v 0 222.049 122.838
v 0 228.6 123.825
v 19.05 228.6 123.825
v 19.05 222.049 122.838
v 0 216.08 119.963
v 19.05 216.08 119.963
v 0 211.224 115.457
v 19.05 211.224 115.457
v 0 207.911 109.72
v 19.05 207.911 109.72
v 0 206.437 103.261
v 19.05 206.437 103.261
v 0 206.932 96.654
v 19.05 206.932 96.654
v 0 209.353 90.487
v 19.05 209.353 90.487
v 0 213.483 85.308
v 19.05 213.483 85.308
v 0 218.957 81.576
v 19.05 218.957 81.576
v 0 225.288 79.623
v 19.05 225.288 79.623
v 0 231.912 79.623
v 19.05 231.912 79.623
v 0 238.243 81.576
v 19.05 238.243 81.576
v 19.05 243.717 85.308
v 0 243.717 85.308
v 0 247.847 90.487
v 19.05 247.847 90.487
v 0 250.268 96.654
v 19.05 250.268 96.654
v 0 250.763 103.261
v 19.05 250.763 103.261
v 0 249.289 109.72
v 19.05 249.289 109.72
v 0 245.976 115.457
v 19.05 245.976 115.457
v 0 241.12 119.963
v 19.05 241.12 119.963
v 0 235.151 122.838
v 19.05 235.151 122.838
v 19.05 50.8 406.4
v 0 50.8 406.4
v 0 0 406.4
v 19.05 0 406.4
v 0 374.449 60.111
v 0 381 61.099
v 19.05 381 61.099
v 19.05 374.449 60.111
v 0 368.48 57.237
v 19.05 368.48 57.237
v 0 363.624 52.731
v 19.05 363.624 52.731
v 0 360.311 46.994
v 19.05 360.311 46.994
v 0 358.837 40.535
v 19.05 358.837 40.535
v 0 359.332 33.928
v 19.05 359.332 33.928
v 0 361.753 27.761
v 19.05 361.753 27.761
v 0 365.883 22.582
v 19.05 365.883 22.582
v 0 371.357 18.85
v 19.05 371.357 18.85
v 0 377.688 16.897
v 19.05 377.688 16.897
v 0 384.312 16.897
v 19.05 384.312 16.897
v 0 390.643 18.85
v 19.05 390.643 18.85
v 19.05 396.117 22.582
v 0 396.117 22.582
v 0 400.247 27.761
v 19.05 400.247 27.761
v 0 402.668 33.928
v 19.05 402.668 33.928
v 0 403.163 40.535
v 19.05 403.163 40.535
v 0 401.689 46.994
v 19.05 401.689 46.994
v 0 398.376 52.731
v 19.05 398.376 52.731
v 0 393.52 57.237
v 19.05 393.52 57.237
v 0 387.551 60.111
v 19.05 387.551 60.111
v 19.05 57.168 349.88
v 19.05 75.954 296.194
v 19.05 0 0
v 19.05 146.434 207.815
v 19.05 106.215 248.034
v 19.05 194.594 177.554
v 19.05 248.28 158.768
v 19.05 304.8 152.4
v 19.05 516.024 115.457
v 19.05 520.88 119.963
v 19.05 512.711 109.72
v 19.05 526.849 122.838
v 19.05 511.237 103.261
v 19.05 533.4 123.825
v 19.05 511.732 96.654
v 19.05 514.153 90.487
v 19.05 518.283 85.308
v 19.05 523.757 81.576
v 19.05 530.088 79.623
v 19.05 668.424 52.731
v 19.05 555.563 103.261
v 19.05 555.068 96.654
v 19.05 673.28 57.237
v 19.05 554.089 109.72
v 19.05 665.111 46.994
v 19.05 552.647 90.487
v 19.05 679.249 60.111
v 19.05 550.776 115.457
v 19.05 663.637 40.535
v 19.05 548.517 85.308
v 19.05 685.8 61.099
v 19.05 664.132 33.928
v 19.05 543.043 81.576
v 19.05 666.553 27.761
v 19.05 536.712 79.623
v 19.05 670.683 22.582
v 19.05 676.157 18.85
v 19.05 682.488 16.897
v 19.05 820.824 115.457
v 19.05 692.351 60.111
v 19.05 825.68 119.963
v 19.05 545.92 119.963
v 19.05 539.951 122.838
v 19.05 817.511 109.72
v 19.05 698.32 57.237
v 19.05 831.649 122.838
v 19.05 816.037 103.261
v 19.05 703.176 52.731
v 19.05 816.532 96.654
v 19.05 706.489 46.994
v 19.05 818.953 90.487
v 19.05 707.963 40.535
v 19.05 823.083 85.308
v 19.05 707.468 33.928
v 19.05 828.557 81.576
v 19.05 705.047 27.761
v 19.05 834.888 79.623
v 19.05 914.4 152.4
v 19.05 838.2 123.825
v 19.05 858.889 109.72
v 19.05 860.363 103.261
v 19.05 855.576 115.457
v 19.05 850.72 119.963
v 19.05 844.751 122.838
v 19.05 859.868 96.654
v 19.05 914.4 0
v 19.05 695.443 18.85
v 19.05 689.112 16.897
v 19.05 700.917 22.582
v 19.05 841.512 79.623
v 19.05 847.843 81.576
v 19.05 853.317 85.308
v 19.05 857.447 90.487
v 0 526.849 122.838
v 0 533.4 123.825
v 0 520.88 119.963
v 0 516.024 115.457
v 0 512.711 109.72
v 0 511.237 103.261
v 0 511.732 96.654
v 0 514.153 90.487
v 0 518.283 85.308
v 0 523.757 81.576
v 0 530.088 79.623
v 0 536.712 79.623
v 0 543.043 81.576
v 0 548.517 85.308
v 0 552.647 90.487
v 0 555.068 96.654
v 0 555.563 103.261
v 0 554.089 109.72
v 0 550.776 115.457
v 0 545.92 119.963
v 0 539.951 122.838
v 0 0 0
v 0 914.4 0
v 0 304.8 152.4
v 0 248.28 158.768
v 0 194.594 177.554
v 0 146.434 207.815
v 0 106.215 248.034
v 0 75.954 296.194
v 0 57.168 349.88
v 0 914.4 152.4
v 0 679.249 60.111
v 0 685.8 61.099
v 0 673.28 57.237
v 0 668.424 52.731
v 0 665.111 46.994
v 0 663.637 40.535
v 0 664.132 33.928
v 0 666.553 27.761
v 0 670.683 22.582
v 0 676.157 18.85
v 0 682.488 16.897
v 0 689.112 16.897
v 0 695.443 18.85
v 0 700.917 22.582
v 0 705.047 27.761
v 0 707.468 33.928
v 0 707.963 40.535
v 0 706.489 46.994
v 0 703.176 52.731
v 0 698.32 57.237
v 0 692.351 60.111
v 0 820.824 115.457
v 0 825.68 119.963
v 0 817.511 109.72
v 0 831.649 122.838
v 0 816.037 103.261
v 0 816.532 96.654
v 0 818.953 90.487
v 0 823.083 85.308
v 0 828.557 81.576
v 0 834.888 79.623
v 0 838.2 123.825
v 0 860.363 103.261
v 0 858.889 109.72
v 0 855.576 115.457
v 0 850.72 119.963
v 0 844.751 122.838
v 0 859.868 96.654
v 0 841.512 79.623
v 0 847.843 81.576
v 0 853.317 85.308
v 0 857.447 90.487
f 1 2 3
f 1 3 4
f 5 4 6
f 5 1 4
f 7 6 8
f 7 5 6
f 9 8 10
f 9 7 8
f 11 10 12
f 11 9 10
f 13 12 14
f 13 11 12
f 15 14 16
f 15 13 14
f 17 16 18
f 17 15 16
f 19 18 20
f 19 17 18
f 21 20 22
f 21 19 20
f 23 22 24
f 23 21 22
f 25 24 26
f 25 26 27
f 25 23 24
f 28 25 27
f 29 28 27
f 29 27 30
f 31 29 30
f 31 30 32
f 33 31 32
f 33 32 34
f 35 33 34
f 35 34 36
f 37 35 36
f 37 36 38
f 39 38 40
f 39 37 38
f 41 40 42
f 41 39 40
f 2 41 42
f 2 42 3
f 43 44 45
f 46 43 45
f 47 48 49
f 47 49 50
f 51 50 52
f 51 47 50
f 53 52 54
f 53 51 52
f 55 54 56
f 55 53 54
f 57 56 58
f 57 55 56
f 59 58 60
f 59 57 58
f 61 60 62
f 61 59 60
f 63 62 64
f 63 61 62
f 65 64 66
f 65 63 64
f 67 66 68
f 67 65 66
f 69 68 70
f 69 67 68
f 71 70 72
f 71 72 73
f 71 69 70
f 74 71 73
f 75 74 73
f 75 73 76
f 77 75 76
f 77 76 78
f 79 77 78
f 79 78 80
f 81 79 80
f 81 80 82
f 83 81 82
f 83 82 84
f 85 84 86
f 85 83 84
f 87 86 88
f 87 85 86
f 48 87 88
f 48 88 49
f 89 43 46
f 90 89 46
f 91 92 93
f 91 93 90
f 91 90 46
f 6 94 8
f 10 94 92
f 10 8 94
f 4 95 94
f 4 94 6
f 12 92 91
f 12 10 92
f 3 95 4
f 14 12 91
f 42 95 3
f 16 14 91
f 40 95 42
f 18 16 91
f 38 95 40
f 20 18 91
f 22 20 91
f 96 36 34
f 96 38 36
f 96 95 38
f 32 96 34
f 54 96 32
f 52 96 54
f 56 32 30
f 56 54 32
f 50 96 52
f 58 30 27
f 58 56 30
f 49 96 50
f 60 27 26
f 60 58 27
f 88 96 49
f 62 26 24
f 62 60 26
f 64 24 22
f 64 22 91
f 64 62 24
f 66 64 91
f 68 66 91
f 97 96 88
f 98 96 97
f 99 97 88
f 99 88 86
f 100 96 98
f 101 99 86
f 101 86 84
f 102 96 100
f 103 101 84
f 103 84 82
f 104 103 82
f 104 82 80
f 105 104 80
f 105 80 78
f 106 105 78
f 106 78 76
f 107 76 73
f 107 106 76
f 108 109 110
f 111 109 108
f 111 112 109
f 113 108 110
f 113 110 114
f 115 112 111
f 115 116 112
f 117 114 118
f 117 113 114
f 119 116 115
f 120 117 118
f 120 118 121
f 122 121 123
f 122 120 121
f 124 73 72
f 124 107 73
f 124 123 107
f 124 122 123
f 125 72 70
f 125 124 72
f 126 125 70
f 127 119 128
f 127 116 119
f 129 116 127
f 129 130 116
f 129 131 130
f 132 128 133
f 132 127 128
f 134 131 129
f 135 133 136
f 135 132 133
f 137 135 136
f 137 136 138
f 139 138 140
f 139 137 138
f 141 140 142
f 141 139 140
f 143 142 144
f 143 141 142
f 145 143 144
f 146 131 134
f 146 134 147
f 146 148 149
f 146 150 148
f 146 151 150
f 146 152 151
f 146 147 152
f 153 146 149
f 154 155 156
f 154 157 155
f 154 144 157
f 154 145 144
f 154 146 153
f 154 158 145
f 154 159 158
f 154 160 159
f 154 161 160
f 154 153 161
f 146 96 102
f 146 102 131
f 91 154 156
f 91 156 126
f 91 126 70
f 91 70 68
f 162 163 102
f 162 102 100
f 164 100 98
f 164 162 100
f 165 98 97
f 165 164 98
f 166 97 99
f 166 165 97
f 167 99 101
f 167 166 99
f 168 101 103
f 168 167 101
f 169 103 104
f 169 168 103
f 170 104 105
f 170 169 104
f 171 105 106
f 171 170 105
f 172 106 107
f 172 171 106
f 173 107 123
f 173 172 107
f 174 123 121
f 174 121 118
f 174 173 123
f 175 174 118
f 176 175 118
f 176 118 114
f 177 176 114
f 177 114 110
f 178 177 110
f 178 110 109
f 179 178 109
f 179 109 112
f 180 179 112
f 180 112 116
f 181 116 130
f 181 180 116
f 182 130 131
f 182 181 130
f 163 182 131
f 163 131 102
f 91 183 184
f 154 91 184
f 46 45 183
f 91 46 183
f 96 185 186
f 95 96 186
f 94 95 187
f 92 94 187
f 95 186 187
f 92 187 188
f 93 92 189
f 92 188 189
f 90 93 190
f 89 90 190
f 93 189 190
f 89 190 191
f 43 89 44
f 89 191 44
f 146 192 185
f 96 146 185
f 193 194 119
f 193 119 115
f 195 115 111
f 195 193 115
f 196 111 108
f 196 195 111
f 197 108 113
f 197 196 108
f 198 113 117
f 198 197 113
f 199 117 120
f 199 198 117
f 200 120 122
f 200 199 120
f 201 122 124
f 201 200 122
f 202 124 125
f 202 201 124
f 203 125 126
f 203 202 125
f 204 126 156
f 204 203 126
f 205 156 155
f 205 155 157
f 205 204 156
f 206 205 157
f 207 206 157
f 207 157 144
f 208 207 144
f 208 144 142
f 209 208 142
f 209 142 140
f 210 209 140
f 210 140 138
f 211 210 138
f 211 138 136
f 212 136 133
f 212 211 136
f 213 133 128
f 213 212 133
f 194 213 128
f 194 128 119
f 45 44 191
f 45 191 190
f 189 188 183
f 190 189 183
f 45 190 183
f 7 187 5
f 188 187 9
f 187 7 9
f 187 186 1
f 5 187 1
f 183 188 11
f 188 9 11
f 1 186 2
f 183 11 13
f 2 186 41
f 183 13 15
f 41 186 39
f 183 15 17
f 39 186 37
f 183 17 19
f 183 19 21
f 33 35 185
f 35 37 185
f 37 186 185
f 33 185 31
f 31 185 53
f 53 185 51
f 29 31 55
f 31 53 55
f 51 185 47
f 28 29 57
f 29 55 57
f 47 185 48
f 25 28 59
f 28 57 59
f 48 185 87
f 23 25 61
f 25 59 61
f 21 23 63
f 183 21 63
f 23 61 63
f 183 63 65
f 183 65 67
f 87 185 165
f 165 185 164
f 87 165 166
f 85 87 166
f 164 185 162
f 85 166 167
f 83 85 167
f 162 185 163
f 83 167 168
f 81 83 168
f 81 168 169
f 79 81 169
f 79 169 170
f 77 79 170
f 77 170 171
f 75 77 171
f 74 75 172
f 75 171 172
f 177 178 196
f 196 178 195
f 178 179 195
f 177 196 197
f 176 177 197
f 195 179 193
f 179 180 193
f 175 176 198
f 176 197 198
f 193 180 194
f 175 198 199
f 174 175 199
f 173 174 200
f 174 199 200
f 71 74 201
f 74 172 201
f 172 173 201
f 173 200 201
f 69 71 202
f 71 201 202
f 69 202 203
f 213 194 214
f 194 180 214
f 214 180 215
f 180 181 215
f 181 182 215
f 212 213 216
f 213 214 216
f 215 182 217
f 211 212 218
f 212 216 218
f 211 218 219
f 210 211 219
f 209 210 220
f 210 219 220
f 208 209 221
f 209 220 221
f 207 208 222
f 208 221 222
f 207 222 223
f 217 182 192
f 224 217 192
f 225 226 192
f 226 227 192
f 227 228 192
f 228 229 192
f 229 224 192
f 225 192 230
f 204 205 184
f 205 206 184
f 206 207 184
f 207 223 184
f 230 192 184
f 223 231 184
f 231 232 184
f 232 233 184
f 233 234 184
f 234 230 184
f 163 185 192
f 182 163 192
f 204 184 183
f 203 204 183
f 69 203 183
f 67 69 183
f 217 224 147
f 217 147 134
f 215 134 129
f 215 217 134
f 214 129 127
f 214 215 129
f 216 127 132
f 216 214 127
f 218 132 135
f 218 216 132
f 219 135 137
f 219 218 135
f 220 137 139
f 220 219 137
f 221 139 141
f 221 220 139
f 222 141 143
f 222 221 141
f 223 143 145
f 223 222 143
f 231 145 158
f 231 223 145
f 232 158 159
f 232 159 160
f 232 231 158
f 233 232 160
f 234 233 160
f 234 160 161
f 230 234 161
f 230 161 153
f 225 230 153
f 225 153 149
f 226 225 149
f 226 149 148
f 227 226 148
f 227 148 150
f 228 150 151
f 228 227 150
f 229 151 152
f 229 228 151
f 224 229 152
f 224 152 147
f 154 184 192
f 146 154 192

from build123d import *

# Parameters (mm, degrees)
SKETCH1_R           = 22.225
BOSS_EXTRUDE1_DEPTH = 19.05


with BuildPart() as part:
    # Sketch1 → Boss-Extrude1 (new body)
    with BuildSketch(Plane(origin=(0, 0, 0), x_dir=(0, 0, -1), z_dir=(1, 0, 0))):
        with BuildLine():
            Line((-152.4, 914.4), (-152.4, 304.8))
            ThreePointArc((-152.4, 304.8), (-226.794877579, 125.194877579), (-406.4, 50.8))
            Line((-406.4, 50.8), (-406.4, 0))
            Line((-406.4, 0), (0, 0))
            Line((0, 0), (0, 914.4))
            Line((0, 914.4), (-152.4, 914.4))
        make_face()
        with Locations(Location((-101.6, 838.2, 0), (0, 0, 180))):
            Circle(SKETCH1_R, mode=Mode.SUBTRACT)
        with Locations(Location((-38.873826797, 685.8, 0), (0, 0, 180))):
            Circle(SKETCH1_R, mode=Mode.SUBTRACT)
        with Locations(Location((-101.6, 533.4, 0), (0, 0, 180))):
            Circle(SKETCH1_R, mode=Mode.SUBTRACT)
        with Locations(Location((-38.873826797, 381, 0), (0, 0, 180))):
            Circle(SKETCH1_R, mode=Mode.SUBTRACT)
        with Locations(Location((-101.6, 228.6, 0), (0, 0, 180))):
            Circle(SKETCH1_R, mode=Mode.SUBTRACT)
    extrude(amount=BOSS_EXTRUDE1_DEPTH)


solid = part.part
